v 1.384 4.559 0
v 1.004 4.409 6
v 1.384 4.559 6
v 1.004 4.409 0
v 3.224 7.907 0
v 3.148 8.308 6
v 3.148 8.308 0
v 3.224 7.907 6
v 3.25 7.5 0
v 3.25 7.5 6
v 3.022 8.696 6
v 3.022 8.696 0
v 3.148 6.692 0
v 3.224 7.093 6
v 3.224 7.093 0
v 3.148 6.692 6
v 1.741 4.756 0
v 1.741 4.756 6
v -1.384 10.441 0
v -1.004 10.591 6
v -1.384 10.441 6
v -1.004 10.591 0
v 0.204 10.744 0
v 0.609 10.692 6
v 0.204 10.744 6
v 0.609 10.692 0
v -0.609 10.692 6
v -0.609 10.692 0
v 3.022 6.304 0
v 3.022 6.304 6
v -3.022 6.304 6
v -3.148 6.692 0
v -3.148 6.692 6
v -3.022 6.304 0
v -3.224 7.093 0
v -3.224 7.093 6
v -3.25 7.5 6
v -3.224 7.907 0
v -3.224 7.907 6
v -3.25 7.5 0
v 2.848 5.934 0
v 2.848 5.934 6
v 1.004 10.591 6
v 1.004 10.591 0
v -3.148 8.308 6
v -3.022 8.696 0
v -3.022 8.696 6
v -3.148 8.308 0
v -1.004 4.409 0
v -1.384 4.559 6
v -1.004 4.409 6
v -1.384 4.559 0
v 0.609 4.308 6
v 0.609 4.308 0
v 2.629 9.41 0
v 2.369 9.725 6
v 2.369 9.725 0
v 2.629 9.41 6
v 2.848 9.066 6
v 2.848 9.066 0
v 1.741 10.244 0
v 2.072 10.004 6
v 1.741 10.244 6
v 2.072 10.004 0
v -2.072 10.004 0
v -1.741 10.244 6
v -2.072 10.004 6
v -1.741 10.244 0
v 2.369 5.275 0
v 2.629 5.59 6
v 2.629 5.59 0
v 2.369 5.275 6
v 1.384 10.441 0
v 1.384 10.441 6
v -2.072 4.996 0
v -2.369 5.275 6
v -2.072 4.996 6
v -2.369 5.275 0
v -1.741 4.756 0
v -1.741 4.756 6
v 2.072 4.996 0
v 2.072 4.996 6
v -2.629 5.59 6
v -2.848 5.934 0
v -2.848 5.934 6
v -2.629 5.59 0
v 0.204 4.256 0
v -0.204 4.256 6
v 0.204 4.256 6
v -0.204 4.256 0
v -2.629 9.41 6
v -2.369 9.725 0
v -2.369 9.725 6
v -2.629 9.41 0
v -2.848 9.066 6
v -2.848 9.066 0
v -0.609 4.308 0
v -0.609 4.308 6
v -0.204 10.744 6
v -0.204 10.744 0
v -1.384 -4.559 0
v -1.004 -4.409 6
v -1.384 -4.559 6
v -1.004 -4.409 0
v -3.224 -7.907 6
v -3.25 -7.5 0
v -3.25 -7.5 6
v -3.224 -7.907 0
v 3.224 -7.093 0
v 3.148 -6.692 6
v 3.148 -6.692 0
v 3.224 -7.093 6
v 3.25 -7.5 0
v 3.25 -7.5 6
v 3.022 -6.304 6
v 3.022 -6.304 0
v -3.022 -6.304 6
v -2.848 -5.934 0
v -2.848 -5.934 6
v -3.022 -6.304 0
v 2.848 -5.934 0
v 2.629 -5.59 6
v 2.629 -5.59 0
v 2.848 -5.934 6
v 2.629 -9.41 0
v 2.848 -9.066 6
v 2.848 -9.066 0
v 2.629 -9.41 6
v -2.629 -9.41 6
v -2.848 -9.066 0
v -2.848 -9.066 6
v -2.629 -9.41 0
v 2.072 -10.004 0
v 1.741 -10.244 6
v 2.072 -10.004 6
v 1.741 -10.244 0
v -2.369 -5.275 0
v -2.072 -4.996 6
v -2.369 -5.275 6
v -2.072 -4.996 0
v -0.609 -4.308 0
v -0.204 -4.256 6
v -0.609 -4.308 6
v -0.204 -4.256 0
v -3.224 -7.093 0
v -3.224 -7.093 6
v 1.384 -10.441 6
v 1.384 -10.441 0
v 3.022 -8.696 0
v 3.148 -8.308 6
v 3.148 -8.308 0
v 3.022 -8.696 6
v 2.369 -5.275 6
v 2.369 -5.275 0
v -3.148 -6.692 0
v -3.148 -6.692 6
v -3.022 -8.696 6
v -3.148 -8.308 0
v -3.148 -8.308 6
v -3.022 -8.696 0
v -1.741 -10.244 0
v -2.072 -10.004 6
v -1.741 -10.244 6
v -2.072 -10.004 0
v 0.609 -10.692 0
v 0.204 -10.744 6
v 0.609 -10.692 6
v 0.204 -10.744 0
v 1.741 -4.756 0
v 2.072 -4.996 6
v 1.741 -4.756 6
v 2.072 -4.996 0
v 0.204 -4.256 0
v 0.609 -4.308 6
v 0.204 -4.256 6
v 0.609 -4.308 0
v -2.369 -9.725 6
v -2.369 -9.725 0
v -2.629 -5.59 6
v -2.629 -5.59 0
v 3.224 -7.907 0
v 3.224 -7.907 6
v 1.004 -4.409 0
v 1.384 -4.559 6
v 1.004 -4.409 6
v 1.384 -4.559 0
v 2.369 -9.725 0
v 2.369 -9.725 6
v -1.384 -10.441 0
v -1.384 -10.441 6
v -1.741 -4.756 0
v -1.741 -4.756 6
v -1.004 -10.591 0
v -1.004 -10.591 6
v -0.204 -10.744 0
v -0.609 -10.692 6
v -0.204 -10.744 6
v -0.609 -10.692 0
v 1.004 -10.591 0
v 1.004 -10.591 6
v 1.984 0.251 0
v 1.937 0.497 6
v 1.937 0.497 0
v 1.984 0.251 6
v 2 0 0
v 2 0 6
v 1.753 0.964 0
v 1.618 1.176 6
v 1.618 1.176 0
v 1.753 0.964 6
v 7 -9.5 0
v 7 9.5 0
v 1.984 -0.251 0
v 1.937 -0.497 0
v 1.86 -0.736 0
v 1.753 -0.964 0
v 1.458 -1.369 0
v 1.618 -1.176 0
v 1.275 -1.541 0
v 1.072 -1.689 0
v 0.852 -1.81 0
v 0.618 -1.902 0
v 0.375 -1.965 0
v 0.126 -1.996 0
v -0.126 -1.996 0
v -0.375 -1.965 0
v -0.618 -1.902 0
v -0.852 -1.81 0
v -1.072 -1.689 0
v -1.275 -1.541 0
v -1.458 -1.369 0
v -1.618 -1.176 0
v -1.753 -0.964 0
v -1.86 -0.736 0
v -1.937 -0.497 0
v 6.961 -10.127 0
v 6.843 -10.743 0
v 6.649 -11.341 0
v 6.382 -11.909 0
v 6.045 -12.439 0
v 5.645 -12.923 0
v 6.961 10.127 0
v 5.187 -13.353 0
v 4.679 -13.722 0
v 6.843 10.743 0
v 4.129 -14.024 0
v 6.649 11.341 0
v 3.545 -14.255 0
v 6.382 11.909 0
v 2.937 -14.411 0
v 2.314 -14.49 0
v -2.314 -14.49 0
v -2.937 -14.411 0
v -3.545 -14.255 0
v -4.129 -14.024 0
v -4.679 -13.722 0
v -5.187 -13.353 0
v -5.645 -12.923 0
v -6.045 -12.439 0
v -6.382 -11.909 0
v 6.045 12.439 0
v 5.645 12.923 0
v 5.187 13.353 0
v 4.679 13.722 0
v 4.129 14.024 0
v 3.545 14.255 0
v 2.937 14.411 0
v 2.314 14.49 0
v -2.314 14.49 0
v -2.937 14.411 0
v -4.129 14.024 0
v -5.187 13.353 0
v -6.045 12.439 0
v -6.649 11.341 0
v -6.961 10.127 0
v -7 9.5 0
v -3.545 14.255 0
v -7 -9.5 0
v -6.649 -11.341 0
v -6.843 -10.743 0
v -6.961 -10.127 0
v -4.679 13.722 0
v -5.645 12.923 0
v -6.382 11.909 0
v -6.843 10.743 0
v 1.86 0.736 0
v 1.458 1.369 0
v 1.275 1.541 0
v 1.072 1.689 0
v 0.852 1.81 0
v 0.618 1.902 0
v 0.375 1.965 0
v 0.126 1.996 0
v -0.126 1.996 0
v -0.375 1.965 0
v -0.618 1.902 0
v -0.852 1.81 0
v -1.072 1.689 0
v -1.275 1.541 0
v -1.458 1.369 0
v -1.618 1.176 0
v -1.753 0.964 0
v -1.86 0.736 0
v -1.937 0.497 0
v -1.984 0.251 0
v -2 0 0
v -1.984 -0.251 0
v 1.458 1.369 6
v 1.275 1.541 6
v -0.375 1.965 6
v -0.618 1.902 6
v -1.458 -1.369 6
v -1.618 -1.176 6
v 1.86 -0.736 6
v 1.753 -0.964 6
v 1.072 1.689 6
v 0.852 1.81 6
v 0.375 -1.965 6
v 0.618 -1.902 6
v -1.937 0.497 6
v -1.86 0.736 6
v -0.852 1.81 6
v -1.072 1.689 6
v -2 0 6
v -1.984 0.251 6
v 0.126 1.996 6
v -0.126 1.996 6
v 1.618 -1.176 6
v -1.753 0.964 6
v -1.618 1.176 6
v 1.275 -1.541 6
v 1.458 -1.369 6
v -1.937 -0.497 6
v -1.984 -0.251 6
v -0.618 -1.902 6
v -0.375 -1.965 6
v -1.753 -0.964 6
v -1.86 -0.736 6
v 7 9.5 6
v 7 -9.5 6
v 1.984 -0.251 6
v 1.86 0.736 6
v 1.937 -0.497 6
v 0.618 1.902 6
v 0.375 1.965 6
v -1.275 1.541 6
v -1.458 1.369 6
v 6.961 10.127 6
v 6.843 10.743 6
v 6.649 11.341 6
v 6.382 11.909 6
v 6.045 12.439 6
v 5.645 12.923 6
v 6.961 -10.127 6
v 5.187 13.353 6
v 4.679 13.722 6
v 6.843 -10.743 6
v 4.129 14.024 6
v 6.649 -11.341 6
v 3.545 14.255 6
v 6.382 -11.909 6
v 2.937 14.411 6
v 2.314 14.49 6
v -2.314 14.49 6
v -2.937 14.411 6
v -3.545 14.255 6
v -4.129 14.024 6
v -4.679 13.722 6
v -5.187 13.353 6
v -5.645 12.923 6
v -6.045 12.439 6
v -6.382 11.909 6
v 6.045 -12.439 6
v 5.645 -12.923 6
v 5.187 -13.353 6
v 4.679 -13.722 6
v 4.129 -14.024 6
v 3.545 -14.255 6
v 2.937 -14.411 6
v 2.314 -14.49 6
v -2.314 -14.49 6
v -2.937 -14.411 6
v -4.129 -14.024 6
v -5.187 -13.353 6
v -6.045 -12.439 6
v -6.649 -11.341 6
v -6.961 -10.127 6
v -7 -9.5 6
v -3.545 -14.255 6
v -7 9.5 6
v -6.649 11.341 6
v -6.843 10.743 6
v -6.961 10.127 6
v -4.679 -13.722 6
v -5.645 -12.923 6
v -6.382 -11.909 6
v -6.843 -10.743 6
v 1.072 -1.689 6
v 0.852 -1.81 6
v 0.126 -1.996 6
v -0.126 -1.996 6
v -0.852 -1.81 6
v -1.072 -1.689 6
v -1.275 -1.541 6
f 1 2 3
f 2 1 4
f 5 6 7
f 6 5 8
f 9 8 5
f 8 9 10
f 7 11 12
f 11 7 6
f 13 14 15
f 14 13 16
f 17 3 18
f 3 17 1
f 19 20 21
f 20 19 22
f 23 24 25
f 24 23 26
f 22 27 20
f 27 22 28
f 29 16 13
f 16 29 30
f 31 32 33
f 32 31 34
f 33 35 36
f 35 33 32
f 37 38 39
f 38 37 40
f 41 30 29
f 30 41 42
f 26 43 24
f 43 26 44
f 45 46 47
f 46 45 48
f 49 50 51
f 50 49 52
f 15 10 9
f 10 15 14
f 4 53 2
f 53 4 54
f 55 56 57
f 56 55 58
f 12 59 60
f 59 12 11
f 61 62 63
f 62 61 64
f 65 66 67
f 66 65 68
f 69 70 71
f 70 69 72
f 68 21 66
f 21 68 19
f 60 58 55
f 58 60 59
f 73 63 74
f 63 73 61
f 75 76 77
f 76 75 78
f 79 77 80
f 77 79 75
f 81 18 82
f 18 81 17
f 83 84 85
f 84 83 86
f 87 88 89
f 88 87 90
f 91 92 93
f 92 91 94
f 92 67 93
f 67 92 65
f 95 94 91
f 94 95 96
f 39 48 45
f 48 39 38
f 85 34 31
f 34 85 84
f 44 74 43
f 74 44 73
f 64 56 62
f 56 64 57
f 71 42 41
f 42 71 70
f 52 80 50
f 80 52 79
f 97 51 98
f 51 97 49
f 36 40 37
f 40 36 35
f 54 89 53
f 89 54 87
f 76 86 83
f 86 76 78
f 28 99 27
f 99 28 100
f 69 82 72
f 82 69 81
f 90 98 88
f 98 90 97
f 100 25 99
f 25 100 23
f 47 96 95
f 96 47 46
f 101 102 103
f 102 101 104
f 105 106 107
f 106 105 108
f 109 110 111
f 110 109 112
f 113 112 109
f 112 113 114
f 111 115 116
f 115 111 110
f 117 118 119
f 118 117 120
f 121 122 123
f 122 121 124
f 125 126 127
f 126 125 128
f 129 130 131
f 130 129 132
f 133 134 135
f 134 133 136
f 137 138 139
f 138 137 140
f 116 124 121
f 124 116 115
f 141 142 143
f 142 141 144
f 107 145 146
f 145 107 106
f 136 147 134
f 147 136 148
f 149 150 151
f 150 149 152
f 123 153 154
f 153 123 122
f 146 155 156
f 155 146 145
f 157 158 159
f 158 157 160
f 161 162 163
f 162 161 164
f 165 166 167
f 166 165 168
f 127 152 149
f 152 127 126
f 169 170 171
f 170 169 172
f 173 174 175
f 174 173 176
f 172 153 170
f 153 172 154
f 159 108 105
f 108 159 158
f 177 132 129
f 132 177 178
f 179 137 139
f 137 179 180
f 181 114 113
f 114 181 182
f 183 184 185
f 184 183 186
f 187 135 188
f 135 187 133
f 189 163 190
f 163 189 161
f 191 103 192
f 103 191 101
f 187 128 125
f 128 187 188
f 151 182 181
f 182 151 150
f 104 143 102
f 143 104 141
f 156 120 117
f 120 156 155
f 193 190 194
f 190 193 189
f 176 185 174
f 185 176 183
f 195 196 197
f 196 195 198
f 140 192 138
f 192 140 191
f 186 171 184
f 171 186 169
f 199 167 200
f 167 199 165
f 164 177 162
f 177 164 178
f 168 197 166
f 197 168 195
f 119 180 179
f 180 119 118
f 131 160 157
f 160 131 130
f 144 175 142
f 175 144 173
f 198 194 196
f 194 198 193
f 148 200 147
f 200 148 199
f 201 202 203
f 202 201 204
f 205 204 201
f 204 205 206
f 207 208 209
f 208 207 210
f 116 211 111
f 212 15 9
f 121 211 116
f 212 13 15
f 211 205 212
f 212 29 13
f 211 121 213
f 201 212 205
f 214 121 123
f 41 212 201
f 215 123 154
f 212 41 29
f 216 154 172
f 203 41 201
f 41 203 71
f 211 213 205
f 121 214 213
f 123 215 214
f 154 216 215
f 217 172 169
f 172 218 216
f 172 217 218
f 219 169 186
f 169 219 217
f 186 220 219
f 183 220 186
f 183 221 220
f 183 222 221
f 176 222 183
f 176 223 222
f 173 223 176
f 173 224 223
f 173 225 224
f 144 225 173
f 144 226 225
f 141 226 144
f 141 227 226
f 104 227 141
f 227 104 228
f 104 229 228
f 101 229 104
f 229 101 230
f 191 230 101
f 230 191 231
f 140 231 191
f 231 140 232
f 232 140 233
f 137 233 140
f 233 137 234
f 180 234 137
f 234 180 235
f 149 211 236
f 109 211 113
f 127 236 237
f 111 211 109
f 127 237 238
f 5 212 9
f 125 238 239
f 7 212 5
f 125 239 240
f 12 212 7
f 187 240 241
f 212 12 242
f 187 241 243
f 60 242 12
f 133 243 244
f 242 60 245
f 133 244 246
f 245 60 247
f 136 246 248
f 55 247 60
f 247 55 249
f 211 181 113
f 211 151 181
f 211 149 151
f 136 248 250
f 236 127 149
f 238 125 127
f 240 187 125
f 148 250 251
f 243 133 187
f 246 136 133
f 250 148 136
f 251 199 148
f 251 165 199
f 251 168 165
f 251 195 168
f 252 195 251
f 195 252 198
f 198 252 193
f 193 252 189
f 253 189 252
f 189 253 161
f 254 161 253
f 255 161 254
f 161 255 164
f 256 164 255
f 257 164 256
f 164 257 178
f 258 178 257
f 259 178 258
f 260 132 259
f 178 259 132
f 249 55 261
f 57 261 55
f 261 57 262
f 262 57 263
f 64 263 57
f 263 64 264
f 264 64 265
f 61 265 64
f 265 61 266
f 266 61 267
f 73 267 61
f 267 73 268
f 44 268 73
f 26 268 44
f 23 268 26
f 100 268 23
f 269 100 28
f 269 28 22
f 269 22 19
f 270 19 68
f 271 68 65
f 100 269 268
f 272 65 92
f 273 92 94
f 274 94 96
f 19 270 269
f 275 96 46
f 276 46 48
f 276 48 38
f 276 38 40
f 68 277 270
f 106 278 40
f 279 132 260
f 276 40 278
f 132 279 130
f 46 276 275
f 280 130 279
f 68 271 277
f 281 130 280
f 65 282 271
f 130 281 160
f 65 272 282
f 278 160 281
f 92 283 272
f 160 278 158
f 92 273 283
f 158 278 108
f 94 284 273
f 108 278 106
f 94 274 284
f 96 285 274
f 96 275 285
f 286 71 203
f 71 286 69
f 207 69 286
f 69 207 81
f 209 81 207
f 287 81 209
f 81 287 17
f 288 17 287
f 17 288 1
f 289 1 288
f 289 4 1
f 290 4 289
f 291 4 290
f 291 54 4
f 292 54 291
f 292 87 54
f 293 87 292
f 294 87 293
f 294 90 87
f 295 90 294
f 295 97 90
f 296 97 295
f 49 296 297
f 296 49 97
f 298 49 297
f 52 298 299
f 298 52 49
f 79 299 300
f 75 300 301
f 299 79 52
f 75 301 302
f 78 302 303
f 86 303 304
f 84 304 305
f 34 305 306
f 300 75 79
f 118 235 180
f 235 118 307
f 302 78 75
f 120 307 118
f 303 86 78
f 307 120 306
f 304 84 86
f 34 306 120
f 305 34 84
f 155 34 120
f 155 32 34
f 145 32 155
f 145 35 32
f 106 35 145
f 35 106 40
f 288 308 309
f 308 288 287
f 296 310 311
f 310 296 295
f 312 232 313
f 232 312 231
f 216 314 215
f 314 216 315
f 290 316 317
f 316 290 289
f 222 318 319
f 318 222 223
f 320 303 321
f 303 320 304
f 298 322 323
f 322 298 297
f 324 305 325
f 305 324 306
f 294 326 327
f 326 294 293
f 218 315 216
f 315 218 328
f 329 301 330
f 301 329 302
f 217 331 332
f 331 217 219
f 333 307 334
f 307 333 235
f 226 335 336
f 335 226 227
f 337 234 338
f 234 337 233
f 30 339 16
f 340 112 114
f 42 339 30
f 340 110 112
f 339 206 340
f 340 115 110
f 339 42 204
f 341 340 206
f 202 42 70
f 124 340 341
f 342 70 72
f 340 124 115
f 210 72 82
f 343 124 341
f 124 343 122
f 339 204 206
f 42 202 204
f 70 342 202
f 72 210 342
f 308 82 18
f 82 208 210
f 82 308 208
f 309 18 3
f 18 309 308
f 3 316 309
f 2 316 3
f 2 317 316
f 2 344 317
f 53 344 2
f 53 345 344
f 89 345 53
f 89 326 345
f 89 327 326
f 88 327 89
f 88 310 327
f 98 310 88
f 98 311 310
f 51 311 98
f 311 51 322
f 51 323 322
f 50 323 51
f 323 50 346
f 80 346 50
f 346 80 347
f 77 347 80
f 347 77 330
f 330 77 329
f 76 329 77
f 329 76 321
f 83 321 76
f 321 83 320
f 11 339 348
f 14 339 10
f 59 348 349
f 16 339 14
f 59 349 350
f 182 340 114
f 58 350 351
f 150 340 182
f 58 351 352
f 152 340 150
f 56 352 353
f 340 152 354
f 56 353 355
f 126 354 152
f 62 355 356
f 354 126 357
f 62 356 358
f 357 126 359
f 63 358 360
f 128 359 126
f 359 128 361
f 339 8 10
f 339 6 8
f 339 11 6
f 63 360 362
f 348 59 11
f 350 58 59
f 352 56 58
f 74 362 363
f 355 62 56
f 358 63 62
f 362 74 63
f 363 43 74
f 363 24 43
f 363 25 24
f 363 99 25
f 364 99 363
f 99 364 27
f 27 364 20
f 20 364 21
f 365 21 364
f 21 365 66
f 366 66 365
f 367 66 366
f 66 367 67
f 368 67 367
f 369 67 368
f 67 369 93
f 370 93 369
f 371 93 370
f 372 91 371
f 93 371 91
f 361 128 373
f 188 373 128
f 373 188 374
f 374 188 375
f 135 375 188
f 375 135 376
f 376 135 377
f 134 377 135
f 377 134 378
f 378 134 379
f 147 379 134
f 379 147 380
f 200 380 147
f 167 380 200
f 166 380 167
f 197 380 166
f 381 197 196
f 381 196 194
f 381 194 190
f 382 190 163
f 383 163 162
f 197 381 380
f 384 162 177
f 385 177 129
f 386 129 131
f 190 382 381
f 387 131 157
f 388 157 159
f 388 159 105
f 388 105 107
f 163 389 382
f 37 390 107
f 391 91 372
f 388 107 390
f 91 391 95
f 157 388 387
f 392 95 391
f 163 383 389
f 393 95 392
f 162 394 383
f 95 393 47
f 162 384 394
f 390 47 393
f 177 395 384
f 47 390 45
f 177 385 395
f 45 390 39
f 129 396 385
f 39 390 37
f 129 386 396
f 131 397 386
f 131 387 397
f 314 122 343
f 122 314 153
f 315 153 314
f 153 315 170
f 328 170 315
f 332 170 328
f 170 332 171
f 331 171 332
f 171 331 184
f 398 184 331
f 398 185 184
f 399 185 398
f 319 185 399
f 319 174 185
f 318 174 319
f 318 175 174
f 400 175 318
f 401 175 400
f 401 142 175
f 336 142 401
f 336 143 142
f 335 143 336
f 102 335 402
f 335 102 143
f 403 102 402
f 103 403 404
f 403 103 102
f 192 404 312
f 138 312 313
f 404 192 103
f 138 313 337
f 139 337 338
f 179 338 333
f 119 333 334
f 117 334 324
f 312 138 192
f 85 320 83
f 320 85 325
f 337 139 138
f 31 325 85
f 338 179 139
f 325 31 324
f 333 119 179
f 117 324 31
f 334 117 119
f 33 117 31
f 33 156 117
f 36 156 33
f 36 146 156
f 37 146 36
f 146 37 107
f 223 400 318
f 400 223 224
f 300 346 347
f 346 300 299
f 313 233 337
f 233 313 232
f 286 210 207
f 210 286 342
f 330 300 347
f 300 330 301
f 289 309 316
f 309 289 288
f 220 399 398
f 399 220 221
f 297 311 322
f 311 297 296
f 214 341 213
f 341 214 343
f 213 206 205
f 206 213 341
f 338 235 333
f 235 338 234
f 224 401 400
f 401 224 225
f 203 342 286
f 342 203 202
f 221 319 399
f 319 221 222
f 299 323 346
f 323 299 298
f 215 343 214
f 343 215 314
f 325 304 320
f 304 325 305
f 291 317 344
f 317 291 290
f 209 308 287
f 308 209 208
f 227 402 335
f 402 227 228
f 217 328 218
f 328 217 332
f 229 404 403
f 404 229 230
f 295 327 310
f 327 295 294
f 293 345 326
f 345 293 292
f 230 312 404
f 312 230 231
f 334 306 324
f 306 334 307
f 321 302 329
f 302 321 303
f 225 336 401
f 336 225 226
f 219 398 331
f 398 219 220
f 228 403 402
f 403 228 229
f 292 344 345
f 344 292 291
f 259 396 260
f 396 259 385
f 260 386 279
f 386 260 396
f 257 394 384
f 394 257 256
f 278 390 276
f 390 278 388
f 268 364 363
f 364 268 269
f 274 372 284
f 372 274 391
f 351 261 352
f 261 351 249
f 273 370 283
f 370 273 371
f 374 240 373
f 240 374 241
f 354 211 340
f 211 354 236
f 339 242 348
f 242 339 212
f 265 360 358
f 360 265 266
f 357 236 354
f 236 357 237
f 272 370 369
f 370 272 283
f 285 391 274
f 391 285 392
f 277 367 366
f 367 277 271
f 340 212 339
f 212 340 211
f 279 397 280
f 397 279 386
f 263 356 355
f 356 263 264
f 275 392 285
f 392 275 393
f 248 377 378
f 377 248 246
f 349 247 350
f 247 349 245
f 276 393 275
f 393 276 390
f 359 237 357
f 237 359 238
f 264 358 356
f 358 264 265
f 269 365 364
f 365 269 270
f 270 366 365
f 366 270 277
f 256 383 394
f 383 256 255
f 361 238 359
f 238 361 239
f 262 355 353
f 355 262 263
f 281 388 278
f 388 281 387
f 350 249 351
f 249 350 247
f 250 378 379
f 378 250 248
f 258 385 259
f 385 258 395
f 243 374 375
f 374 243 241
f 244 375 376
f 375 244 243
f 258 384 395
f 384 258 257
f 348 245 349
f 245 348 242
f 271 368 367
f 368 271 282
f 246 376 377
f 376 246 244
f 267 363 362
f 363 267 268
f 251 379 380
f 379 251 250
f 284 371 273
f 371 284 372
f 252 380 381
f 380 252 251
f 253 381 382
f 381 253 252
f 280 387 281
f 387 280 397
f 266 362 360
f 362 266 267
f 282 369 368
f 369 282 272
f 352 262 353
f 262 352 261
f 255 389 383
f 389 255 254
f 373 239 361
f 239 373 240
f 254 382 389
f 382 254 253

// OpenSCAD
$fn = 50;


difference() {
	union() {
		hull() {
			translate(v = [-2.0000000000, 9.5000000000, 0]) {
				cylinder(h = 6, r = 5);
			}
			translate(v = [2.0000000000, 9.5000000000, 0]) {
				cylinder(h = 6, r = 5);
			}
			translate(v = [-2.0000000000, -9.5000000000, 0]) {
				cylinder(h = 6, r = 5);
			}
			translate(v = [2.0000000000, -9.5000000000, 0]) {
				cylinder(h = 6, r = 5);
			}
		}
	}
	union() {
		#translate(v = [0.0000000000, 7.5000000000, 0]) {
			cylinder(h = 6, r = 3.2500000000);
		}
		#translate(v = [0.0000000000, -7.5000000000, 0]) {
			cylinder(h = 6, r = 3.2500000000);
		}
		#translate(v = [0.0000000000, -7.5000000000, -100.0000000000]) {
			cylinder(h = 200, r = 3.2500000000);
		}
		#translate(v = [0.0000000000, -7.5000000000, -100.0000000000]) {
			cylinder(h = 200, r = 3.2500000000);
		}
		#translate(v = [0.0000000000, 7.5000000000, -100.0000000000]) {
			cylinder(h = 200, r = 3.2500000000);
		}
		#translate(v = [0.0000000000, 7.5000000000, -100.0000000000]) {
			cylinder(h = 200, r = 3.2500000000);
		}
		#translate(v = [0.0000000000, 7.5000000000, 0]) {
			cylinder(h = 6, r = 1.8000000000);
		}
		#translate(v = [0.0000000000, -7.5000000000, 0]) {
			cylinder(h = 6, r = 1.8000000000);
		}
		#translate(v = [0.0000000000, 7.5000000000, 0]) {
			cylinder(h = 6, r = 1.8000000000);
		}
		#translate(v = [0.0000000000, -7.5000000000, 0]) {
			cylinder(h = 6, r = 1.8000000000);
		}
		#translate(v = [0.0000000000, 7.5000000000, 0]) {
			cylinder(h = 6, r = 1.8000000000);
		}
		#translate(v = [0.0000000000, -7.5000000000, 0]) {
			cylinder(h = 6, r = 1.8000000000);
		}
		#cylinder(h = 6, r = 2.0000000000);
	}
}
